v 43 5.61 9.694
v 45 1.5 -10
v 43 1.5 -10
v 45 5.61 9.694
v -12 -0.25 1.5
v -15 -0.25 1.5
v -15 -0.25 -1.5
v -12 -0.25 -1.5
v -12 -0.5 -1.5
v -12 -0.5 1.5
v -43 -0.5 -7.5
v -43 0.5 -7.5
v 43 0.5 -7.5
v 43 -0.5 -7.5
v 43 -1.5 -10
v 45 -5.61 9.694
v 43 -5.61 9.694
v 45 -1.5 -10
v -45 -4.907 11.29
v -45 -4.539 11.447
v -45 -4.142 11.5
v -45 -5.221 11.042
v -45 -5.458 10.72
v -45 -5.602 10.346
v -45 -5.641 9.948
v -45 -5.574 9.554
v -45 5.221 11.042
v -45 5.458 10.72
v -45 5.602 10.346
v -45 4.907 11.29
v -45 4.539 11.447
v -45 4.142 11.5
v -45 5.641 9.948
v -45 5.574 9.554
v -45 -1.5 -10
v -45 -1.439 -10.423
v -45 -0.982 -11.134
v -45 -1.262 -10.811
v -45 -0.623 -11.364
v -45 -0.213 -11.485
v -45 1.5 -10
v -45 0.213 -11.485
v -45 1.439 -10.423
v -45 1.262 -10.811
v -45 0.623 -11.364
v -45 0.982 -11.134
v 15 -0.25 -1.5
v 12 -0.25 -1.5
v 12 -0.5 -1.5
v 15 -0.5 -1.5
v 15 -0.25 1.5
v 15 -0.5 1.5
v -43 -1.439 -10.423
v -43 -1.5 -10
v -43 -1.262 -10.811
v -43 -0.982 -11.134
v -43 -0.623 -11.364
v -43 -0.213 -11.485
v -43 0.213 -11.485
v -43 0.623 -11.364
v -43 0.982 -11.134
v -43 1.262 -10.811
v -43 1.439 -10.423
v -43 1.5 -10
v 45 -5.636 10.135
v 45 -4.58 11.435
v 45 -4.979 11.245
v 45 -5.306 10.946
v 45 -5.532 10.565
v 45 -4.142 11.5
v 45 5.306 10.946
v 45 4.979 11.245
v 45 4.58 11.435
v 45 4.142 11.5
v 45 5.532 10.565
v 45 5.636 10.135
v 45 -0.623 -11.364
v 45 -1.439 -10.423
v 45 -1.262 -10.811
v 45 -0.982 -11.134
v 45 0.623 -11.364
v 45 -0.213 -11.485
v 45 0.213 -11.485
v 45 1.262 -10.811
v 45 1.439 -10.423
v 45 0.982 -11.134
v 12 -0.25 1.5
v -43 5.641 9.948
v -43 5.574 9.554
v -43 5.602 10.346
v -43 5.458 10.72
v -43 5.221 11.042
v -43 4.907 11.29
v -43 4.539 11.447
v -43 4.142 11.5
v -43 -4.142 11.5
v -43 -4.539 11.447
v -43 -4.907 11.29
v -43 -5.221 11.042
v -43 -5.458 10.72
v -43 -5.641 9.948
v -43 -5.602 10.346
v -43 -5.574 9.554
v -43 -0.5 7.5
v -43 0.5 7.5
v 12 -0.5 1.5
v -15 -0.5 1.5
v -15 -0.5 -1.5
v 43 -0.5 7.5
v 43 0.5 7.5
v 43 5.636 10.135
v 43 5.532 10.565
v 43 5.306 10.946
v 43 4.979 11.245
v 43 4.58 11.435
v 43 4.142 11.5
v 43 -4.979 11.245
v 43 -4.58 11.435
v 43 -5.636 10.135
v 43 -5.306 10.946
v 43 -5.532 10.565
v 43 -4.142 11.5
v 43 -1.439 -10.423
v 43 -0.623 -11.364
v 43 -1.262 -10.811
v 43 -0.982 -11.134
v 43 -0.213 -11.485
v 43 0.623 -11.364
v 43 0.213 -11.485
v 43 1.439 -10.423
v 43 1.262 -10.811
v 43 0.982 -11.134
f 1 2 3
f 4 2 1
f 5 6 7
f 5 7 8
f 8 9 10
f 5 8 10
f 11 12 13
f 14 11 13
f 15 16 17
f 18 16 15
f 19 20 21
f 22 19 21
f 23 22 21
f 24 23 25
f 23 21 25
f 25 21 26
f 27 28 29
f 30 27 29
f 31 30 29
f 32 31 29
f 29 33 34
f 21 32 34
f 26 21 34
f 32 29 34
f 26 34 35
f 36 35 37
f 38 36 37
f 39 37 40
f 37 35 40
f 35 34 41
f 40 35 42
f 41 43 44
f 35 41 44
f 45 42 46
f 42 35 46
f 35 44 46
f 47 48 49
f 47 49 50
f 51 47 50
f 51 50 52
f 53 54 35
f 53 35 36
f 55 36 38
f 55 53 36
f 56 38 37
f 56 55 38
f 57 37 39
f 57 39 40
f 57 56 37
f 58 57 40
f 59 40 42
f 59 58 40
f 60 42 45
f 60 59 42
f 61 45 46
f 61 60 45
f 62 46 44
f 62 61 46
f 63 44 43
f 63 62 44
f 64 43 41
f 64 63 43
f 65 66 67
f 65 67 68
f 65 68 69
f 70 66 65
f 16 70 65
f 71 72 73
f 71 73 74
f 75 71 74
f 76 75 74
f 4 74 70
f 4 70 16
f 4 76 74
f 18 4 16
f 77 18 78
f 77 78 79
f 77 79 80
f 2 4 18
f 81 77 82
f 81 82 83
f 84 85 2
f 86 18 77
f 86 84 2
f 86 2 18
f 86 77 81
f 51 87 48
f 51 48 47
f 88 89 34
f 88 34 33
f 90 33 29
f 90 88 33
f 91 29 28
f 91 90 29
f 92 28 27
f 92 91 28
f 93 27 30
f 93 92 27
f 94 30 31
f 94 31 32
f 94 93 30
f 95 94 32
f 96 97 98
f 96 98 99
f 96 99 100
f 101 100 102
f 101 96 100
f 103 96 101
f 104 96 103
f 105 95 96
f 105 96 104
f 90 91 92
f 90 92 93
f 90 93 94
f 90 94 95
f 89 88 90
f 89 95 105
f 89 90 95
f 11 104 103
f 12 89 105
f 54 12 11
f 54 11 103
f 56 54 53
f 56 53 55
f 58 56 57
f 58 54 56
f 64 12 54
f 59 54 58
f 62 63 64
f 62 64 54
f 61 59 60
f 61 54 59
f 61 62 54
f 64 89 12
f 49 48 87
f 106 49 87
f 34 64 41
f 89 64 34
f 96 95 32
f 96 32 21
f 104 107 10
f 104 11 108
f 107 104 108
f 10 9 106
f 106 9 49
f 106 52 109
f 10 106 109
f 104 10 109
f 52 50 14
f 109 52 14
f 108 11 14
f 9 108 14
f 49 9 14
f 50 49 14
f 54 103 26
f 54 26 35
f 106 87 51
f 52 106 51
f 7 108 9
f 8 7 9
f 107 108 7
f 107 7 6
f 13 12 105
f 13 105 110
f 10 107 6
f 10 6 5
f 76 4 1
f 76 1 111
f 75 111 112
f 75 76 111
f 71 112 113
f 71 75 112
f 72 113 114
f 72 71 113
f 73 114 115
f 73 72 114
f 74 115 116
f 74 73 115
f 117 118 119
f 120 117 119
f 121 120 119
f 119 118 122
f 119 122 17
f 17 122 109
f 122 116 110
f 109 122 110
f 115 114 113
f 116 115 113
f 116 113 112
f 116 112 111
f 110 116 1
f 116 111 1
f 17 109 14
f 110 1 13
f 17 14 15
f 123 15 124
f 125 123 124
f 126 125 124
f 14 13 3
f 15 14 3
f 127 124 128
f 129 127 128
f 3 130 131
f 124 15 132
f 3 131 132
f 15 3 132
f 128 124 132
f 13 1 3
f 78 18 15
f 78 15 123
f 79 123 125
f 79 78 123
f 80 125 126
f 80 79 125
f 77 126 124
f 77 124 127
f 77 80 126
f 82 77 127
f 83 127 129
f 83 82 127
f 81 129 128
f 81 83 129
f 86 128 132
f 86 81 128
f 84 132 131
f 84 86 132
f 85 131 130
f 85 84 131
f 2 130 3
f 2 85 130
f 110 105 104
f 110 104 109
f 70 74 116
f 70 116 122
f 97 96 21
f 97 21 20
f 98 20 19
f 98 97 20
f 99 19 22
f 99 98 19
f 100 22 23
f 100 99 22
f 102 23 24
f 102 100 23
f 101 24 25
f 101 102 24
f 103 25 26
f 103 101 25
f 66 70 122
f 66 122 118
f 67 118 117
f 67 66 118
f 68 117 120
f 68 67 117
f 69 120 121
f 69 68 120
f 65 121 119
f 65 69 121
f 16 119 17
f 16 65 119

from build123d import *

# Parameters (mm, degrees)
SKETCH1_W           = 90
SKETCH1_H           = 15
BOSS_EXTRUDE1_DEPTH = 0.5
BOSS_EXTRUDE2_DEPTH = 2
BOSS_EXTRUDE3_START = -2
BOSS_EXTRUDE3_DEPTH = 2
SKETCH4_W           = 3
SKETCH4_H           = 3
CUT_EXTRUDE1_DEPTH  = 0.25


with BuildPart() as part:
    # Sketch1 → Boss-Extrude1 (new, symmetric)
    with BuildSketch(Plane(origin=(0, 0, 0), x_dir=(1, 0, 0), z_dir=(0, 1, 0))):
        Rectangle(SKETCH1_W, SKETCH1_H)
    extrude(amount=BOSS_EXTRUDE1_DEPTH, both=True)

    # Sketch2 → Boss-Extrude2 (add)
    with BuildSketch(Plane(origin=(45, 0, 0), x_dir=(0, 0, -1), z_dir=(1, 0, 0))):
        with BuildLine():
            Line((-11.5, 4.142135624), (-11.5, -4.142135624))
            ThreePointArc((-11.5, -4.142135624), (-10.946118457, -5.306120102), (-9.69352018, -5.610491888))
            Line((-9.69352018, -5.610491888), (10, -1.5))
            ThreePointArc((10, -1.5), (11.5, 0), (10, 1.5))
            Line((10, 1.5), (-9.69352018, 5.610491888))
            ThreePointArc((-9.69352018, 5.610491888), (-10.946118457, 5.306120102), (-11.5, 4.142135624))
        make_face()
    extrude(amount=-BOSS_EXTRUDE2_DEPTH)

    # Sketch3 → Boss-Extrude3 (add)
    with BuildSketch(Plane.ZY.offset(45).offset(BOSS_EXTRUDE3_START)):
        with BuildLine():
            Line((-10, 1.5), (9.553557208, 5.574158261))
            ThreePointArc((9.553557208, 5.574158261), (10.888913891, 5.350370739), (11.5, 4.142135624))
            Line((11.5, 4.142135624), (11.5, -4.142135624))
            ThreePointArc((11.5, -4.142135624), (10.888913891, -5.350370739), (9.553557208, -5.574158261))
            Line((9.553557208, -5.574158261), (-10, -1.5))
            ThreePointArc((-10, -1.5), (-11.5, 0), (-10, 1.5))
        make_face()
    extrude(amount=BOSS_EXTRUDE3_DEPTH)

    # Sketch4 → Cut-Extrude1 (cut, symmetric)
    with BuildSketch(Plane.XZ.offset(0.5)):
        with Locations((13.5, 0)):
            Rectangle(SKETCH4_W, SKETCH4_H)
        with Locations((-13.5, 0)):
            Rectangle(SKETCH4_W, SKETCH4_H)
    extrude(amount=CUT_EXTRUDE1_DEPTH, both=True, mode=Mode.SUBTRACT)


solid = part.part
